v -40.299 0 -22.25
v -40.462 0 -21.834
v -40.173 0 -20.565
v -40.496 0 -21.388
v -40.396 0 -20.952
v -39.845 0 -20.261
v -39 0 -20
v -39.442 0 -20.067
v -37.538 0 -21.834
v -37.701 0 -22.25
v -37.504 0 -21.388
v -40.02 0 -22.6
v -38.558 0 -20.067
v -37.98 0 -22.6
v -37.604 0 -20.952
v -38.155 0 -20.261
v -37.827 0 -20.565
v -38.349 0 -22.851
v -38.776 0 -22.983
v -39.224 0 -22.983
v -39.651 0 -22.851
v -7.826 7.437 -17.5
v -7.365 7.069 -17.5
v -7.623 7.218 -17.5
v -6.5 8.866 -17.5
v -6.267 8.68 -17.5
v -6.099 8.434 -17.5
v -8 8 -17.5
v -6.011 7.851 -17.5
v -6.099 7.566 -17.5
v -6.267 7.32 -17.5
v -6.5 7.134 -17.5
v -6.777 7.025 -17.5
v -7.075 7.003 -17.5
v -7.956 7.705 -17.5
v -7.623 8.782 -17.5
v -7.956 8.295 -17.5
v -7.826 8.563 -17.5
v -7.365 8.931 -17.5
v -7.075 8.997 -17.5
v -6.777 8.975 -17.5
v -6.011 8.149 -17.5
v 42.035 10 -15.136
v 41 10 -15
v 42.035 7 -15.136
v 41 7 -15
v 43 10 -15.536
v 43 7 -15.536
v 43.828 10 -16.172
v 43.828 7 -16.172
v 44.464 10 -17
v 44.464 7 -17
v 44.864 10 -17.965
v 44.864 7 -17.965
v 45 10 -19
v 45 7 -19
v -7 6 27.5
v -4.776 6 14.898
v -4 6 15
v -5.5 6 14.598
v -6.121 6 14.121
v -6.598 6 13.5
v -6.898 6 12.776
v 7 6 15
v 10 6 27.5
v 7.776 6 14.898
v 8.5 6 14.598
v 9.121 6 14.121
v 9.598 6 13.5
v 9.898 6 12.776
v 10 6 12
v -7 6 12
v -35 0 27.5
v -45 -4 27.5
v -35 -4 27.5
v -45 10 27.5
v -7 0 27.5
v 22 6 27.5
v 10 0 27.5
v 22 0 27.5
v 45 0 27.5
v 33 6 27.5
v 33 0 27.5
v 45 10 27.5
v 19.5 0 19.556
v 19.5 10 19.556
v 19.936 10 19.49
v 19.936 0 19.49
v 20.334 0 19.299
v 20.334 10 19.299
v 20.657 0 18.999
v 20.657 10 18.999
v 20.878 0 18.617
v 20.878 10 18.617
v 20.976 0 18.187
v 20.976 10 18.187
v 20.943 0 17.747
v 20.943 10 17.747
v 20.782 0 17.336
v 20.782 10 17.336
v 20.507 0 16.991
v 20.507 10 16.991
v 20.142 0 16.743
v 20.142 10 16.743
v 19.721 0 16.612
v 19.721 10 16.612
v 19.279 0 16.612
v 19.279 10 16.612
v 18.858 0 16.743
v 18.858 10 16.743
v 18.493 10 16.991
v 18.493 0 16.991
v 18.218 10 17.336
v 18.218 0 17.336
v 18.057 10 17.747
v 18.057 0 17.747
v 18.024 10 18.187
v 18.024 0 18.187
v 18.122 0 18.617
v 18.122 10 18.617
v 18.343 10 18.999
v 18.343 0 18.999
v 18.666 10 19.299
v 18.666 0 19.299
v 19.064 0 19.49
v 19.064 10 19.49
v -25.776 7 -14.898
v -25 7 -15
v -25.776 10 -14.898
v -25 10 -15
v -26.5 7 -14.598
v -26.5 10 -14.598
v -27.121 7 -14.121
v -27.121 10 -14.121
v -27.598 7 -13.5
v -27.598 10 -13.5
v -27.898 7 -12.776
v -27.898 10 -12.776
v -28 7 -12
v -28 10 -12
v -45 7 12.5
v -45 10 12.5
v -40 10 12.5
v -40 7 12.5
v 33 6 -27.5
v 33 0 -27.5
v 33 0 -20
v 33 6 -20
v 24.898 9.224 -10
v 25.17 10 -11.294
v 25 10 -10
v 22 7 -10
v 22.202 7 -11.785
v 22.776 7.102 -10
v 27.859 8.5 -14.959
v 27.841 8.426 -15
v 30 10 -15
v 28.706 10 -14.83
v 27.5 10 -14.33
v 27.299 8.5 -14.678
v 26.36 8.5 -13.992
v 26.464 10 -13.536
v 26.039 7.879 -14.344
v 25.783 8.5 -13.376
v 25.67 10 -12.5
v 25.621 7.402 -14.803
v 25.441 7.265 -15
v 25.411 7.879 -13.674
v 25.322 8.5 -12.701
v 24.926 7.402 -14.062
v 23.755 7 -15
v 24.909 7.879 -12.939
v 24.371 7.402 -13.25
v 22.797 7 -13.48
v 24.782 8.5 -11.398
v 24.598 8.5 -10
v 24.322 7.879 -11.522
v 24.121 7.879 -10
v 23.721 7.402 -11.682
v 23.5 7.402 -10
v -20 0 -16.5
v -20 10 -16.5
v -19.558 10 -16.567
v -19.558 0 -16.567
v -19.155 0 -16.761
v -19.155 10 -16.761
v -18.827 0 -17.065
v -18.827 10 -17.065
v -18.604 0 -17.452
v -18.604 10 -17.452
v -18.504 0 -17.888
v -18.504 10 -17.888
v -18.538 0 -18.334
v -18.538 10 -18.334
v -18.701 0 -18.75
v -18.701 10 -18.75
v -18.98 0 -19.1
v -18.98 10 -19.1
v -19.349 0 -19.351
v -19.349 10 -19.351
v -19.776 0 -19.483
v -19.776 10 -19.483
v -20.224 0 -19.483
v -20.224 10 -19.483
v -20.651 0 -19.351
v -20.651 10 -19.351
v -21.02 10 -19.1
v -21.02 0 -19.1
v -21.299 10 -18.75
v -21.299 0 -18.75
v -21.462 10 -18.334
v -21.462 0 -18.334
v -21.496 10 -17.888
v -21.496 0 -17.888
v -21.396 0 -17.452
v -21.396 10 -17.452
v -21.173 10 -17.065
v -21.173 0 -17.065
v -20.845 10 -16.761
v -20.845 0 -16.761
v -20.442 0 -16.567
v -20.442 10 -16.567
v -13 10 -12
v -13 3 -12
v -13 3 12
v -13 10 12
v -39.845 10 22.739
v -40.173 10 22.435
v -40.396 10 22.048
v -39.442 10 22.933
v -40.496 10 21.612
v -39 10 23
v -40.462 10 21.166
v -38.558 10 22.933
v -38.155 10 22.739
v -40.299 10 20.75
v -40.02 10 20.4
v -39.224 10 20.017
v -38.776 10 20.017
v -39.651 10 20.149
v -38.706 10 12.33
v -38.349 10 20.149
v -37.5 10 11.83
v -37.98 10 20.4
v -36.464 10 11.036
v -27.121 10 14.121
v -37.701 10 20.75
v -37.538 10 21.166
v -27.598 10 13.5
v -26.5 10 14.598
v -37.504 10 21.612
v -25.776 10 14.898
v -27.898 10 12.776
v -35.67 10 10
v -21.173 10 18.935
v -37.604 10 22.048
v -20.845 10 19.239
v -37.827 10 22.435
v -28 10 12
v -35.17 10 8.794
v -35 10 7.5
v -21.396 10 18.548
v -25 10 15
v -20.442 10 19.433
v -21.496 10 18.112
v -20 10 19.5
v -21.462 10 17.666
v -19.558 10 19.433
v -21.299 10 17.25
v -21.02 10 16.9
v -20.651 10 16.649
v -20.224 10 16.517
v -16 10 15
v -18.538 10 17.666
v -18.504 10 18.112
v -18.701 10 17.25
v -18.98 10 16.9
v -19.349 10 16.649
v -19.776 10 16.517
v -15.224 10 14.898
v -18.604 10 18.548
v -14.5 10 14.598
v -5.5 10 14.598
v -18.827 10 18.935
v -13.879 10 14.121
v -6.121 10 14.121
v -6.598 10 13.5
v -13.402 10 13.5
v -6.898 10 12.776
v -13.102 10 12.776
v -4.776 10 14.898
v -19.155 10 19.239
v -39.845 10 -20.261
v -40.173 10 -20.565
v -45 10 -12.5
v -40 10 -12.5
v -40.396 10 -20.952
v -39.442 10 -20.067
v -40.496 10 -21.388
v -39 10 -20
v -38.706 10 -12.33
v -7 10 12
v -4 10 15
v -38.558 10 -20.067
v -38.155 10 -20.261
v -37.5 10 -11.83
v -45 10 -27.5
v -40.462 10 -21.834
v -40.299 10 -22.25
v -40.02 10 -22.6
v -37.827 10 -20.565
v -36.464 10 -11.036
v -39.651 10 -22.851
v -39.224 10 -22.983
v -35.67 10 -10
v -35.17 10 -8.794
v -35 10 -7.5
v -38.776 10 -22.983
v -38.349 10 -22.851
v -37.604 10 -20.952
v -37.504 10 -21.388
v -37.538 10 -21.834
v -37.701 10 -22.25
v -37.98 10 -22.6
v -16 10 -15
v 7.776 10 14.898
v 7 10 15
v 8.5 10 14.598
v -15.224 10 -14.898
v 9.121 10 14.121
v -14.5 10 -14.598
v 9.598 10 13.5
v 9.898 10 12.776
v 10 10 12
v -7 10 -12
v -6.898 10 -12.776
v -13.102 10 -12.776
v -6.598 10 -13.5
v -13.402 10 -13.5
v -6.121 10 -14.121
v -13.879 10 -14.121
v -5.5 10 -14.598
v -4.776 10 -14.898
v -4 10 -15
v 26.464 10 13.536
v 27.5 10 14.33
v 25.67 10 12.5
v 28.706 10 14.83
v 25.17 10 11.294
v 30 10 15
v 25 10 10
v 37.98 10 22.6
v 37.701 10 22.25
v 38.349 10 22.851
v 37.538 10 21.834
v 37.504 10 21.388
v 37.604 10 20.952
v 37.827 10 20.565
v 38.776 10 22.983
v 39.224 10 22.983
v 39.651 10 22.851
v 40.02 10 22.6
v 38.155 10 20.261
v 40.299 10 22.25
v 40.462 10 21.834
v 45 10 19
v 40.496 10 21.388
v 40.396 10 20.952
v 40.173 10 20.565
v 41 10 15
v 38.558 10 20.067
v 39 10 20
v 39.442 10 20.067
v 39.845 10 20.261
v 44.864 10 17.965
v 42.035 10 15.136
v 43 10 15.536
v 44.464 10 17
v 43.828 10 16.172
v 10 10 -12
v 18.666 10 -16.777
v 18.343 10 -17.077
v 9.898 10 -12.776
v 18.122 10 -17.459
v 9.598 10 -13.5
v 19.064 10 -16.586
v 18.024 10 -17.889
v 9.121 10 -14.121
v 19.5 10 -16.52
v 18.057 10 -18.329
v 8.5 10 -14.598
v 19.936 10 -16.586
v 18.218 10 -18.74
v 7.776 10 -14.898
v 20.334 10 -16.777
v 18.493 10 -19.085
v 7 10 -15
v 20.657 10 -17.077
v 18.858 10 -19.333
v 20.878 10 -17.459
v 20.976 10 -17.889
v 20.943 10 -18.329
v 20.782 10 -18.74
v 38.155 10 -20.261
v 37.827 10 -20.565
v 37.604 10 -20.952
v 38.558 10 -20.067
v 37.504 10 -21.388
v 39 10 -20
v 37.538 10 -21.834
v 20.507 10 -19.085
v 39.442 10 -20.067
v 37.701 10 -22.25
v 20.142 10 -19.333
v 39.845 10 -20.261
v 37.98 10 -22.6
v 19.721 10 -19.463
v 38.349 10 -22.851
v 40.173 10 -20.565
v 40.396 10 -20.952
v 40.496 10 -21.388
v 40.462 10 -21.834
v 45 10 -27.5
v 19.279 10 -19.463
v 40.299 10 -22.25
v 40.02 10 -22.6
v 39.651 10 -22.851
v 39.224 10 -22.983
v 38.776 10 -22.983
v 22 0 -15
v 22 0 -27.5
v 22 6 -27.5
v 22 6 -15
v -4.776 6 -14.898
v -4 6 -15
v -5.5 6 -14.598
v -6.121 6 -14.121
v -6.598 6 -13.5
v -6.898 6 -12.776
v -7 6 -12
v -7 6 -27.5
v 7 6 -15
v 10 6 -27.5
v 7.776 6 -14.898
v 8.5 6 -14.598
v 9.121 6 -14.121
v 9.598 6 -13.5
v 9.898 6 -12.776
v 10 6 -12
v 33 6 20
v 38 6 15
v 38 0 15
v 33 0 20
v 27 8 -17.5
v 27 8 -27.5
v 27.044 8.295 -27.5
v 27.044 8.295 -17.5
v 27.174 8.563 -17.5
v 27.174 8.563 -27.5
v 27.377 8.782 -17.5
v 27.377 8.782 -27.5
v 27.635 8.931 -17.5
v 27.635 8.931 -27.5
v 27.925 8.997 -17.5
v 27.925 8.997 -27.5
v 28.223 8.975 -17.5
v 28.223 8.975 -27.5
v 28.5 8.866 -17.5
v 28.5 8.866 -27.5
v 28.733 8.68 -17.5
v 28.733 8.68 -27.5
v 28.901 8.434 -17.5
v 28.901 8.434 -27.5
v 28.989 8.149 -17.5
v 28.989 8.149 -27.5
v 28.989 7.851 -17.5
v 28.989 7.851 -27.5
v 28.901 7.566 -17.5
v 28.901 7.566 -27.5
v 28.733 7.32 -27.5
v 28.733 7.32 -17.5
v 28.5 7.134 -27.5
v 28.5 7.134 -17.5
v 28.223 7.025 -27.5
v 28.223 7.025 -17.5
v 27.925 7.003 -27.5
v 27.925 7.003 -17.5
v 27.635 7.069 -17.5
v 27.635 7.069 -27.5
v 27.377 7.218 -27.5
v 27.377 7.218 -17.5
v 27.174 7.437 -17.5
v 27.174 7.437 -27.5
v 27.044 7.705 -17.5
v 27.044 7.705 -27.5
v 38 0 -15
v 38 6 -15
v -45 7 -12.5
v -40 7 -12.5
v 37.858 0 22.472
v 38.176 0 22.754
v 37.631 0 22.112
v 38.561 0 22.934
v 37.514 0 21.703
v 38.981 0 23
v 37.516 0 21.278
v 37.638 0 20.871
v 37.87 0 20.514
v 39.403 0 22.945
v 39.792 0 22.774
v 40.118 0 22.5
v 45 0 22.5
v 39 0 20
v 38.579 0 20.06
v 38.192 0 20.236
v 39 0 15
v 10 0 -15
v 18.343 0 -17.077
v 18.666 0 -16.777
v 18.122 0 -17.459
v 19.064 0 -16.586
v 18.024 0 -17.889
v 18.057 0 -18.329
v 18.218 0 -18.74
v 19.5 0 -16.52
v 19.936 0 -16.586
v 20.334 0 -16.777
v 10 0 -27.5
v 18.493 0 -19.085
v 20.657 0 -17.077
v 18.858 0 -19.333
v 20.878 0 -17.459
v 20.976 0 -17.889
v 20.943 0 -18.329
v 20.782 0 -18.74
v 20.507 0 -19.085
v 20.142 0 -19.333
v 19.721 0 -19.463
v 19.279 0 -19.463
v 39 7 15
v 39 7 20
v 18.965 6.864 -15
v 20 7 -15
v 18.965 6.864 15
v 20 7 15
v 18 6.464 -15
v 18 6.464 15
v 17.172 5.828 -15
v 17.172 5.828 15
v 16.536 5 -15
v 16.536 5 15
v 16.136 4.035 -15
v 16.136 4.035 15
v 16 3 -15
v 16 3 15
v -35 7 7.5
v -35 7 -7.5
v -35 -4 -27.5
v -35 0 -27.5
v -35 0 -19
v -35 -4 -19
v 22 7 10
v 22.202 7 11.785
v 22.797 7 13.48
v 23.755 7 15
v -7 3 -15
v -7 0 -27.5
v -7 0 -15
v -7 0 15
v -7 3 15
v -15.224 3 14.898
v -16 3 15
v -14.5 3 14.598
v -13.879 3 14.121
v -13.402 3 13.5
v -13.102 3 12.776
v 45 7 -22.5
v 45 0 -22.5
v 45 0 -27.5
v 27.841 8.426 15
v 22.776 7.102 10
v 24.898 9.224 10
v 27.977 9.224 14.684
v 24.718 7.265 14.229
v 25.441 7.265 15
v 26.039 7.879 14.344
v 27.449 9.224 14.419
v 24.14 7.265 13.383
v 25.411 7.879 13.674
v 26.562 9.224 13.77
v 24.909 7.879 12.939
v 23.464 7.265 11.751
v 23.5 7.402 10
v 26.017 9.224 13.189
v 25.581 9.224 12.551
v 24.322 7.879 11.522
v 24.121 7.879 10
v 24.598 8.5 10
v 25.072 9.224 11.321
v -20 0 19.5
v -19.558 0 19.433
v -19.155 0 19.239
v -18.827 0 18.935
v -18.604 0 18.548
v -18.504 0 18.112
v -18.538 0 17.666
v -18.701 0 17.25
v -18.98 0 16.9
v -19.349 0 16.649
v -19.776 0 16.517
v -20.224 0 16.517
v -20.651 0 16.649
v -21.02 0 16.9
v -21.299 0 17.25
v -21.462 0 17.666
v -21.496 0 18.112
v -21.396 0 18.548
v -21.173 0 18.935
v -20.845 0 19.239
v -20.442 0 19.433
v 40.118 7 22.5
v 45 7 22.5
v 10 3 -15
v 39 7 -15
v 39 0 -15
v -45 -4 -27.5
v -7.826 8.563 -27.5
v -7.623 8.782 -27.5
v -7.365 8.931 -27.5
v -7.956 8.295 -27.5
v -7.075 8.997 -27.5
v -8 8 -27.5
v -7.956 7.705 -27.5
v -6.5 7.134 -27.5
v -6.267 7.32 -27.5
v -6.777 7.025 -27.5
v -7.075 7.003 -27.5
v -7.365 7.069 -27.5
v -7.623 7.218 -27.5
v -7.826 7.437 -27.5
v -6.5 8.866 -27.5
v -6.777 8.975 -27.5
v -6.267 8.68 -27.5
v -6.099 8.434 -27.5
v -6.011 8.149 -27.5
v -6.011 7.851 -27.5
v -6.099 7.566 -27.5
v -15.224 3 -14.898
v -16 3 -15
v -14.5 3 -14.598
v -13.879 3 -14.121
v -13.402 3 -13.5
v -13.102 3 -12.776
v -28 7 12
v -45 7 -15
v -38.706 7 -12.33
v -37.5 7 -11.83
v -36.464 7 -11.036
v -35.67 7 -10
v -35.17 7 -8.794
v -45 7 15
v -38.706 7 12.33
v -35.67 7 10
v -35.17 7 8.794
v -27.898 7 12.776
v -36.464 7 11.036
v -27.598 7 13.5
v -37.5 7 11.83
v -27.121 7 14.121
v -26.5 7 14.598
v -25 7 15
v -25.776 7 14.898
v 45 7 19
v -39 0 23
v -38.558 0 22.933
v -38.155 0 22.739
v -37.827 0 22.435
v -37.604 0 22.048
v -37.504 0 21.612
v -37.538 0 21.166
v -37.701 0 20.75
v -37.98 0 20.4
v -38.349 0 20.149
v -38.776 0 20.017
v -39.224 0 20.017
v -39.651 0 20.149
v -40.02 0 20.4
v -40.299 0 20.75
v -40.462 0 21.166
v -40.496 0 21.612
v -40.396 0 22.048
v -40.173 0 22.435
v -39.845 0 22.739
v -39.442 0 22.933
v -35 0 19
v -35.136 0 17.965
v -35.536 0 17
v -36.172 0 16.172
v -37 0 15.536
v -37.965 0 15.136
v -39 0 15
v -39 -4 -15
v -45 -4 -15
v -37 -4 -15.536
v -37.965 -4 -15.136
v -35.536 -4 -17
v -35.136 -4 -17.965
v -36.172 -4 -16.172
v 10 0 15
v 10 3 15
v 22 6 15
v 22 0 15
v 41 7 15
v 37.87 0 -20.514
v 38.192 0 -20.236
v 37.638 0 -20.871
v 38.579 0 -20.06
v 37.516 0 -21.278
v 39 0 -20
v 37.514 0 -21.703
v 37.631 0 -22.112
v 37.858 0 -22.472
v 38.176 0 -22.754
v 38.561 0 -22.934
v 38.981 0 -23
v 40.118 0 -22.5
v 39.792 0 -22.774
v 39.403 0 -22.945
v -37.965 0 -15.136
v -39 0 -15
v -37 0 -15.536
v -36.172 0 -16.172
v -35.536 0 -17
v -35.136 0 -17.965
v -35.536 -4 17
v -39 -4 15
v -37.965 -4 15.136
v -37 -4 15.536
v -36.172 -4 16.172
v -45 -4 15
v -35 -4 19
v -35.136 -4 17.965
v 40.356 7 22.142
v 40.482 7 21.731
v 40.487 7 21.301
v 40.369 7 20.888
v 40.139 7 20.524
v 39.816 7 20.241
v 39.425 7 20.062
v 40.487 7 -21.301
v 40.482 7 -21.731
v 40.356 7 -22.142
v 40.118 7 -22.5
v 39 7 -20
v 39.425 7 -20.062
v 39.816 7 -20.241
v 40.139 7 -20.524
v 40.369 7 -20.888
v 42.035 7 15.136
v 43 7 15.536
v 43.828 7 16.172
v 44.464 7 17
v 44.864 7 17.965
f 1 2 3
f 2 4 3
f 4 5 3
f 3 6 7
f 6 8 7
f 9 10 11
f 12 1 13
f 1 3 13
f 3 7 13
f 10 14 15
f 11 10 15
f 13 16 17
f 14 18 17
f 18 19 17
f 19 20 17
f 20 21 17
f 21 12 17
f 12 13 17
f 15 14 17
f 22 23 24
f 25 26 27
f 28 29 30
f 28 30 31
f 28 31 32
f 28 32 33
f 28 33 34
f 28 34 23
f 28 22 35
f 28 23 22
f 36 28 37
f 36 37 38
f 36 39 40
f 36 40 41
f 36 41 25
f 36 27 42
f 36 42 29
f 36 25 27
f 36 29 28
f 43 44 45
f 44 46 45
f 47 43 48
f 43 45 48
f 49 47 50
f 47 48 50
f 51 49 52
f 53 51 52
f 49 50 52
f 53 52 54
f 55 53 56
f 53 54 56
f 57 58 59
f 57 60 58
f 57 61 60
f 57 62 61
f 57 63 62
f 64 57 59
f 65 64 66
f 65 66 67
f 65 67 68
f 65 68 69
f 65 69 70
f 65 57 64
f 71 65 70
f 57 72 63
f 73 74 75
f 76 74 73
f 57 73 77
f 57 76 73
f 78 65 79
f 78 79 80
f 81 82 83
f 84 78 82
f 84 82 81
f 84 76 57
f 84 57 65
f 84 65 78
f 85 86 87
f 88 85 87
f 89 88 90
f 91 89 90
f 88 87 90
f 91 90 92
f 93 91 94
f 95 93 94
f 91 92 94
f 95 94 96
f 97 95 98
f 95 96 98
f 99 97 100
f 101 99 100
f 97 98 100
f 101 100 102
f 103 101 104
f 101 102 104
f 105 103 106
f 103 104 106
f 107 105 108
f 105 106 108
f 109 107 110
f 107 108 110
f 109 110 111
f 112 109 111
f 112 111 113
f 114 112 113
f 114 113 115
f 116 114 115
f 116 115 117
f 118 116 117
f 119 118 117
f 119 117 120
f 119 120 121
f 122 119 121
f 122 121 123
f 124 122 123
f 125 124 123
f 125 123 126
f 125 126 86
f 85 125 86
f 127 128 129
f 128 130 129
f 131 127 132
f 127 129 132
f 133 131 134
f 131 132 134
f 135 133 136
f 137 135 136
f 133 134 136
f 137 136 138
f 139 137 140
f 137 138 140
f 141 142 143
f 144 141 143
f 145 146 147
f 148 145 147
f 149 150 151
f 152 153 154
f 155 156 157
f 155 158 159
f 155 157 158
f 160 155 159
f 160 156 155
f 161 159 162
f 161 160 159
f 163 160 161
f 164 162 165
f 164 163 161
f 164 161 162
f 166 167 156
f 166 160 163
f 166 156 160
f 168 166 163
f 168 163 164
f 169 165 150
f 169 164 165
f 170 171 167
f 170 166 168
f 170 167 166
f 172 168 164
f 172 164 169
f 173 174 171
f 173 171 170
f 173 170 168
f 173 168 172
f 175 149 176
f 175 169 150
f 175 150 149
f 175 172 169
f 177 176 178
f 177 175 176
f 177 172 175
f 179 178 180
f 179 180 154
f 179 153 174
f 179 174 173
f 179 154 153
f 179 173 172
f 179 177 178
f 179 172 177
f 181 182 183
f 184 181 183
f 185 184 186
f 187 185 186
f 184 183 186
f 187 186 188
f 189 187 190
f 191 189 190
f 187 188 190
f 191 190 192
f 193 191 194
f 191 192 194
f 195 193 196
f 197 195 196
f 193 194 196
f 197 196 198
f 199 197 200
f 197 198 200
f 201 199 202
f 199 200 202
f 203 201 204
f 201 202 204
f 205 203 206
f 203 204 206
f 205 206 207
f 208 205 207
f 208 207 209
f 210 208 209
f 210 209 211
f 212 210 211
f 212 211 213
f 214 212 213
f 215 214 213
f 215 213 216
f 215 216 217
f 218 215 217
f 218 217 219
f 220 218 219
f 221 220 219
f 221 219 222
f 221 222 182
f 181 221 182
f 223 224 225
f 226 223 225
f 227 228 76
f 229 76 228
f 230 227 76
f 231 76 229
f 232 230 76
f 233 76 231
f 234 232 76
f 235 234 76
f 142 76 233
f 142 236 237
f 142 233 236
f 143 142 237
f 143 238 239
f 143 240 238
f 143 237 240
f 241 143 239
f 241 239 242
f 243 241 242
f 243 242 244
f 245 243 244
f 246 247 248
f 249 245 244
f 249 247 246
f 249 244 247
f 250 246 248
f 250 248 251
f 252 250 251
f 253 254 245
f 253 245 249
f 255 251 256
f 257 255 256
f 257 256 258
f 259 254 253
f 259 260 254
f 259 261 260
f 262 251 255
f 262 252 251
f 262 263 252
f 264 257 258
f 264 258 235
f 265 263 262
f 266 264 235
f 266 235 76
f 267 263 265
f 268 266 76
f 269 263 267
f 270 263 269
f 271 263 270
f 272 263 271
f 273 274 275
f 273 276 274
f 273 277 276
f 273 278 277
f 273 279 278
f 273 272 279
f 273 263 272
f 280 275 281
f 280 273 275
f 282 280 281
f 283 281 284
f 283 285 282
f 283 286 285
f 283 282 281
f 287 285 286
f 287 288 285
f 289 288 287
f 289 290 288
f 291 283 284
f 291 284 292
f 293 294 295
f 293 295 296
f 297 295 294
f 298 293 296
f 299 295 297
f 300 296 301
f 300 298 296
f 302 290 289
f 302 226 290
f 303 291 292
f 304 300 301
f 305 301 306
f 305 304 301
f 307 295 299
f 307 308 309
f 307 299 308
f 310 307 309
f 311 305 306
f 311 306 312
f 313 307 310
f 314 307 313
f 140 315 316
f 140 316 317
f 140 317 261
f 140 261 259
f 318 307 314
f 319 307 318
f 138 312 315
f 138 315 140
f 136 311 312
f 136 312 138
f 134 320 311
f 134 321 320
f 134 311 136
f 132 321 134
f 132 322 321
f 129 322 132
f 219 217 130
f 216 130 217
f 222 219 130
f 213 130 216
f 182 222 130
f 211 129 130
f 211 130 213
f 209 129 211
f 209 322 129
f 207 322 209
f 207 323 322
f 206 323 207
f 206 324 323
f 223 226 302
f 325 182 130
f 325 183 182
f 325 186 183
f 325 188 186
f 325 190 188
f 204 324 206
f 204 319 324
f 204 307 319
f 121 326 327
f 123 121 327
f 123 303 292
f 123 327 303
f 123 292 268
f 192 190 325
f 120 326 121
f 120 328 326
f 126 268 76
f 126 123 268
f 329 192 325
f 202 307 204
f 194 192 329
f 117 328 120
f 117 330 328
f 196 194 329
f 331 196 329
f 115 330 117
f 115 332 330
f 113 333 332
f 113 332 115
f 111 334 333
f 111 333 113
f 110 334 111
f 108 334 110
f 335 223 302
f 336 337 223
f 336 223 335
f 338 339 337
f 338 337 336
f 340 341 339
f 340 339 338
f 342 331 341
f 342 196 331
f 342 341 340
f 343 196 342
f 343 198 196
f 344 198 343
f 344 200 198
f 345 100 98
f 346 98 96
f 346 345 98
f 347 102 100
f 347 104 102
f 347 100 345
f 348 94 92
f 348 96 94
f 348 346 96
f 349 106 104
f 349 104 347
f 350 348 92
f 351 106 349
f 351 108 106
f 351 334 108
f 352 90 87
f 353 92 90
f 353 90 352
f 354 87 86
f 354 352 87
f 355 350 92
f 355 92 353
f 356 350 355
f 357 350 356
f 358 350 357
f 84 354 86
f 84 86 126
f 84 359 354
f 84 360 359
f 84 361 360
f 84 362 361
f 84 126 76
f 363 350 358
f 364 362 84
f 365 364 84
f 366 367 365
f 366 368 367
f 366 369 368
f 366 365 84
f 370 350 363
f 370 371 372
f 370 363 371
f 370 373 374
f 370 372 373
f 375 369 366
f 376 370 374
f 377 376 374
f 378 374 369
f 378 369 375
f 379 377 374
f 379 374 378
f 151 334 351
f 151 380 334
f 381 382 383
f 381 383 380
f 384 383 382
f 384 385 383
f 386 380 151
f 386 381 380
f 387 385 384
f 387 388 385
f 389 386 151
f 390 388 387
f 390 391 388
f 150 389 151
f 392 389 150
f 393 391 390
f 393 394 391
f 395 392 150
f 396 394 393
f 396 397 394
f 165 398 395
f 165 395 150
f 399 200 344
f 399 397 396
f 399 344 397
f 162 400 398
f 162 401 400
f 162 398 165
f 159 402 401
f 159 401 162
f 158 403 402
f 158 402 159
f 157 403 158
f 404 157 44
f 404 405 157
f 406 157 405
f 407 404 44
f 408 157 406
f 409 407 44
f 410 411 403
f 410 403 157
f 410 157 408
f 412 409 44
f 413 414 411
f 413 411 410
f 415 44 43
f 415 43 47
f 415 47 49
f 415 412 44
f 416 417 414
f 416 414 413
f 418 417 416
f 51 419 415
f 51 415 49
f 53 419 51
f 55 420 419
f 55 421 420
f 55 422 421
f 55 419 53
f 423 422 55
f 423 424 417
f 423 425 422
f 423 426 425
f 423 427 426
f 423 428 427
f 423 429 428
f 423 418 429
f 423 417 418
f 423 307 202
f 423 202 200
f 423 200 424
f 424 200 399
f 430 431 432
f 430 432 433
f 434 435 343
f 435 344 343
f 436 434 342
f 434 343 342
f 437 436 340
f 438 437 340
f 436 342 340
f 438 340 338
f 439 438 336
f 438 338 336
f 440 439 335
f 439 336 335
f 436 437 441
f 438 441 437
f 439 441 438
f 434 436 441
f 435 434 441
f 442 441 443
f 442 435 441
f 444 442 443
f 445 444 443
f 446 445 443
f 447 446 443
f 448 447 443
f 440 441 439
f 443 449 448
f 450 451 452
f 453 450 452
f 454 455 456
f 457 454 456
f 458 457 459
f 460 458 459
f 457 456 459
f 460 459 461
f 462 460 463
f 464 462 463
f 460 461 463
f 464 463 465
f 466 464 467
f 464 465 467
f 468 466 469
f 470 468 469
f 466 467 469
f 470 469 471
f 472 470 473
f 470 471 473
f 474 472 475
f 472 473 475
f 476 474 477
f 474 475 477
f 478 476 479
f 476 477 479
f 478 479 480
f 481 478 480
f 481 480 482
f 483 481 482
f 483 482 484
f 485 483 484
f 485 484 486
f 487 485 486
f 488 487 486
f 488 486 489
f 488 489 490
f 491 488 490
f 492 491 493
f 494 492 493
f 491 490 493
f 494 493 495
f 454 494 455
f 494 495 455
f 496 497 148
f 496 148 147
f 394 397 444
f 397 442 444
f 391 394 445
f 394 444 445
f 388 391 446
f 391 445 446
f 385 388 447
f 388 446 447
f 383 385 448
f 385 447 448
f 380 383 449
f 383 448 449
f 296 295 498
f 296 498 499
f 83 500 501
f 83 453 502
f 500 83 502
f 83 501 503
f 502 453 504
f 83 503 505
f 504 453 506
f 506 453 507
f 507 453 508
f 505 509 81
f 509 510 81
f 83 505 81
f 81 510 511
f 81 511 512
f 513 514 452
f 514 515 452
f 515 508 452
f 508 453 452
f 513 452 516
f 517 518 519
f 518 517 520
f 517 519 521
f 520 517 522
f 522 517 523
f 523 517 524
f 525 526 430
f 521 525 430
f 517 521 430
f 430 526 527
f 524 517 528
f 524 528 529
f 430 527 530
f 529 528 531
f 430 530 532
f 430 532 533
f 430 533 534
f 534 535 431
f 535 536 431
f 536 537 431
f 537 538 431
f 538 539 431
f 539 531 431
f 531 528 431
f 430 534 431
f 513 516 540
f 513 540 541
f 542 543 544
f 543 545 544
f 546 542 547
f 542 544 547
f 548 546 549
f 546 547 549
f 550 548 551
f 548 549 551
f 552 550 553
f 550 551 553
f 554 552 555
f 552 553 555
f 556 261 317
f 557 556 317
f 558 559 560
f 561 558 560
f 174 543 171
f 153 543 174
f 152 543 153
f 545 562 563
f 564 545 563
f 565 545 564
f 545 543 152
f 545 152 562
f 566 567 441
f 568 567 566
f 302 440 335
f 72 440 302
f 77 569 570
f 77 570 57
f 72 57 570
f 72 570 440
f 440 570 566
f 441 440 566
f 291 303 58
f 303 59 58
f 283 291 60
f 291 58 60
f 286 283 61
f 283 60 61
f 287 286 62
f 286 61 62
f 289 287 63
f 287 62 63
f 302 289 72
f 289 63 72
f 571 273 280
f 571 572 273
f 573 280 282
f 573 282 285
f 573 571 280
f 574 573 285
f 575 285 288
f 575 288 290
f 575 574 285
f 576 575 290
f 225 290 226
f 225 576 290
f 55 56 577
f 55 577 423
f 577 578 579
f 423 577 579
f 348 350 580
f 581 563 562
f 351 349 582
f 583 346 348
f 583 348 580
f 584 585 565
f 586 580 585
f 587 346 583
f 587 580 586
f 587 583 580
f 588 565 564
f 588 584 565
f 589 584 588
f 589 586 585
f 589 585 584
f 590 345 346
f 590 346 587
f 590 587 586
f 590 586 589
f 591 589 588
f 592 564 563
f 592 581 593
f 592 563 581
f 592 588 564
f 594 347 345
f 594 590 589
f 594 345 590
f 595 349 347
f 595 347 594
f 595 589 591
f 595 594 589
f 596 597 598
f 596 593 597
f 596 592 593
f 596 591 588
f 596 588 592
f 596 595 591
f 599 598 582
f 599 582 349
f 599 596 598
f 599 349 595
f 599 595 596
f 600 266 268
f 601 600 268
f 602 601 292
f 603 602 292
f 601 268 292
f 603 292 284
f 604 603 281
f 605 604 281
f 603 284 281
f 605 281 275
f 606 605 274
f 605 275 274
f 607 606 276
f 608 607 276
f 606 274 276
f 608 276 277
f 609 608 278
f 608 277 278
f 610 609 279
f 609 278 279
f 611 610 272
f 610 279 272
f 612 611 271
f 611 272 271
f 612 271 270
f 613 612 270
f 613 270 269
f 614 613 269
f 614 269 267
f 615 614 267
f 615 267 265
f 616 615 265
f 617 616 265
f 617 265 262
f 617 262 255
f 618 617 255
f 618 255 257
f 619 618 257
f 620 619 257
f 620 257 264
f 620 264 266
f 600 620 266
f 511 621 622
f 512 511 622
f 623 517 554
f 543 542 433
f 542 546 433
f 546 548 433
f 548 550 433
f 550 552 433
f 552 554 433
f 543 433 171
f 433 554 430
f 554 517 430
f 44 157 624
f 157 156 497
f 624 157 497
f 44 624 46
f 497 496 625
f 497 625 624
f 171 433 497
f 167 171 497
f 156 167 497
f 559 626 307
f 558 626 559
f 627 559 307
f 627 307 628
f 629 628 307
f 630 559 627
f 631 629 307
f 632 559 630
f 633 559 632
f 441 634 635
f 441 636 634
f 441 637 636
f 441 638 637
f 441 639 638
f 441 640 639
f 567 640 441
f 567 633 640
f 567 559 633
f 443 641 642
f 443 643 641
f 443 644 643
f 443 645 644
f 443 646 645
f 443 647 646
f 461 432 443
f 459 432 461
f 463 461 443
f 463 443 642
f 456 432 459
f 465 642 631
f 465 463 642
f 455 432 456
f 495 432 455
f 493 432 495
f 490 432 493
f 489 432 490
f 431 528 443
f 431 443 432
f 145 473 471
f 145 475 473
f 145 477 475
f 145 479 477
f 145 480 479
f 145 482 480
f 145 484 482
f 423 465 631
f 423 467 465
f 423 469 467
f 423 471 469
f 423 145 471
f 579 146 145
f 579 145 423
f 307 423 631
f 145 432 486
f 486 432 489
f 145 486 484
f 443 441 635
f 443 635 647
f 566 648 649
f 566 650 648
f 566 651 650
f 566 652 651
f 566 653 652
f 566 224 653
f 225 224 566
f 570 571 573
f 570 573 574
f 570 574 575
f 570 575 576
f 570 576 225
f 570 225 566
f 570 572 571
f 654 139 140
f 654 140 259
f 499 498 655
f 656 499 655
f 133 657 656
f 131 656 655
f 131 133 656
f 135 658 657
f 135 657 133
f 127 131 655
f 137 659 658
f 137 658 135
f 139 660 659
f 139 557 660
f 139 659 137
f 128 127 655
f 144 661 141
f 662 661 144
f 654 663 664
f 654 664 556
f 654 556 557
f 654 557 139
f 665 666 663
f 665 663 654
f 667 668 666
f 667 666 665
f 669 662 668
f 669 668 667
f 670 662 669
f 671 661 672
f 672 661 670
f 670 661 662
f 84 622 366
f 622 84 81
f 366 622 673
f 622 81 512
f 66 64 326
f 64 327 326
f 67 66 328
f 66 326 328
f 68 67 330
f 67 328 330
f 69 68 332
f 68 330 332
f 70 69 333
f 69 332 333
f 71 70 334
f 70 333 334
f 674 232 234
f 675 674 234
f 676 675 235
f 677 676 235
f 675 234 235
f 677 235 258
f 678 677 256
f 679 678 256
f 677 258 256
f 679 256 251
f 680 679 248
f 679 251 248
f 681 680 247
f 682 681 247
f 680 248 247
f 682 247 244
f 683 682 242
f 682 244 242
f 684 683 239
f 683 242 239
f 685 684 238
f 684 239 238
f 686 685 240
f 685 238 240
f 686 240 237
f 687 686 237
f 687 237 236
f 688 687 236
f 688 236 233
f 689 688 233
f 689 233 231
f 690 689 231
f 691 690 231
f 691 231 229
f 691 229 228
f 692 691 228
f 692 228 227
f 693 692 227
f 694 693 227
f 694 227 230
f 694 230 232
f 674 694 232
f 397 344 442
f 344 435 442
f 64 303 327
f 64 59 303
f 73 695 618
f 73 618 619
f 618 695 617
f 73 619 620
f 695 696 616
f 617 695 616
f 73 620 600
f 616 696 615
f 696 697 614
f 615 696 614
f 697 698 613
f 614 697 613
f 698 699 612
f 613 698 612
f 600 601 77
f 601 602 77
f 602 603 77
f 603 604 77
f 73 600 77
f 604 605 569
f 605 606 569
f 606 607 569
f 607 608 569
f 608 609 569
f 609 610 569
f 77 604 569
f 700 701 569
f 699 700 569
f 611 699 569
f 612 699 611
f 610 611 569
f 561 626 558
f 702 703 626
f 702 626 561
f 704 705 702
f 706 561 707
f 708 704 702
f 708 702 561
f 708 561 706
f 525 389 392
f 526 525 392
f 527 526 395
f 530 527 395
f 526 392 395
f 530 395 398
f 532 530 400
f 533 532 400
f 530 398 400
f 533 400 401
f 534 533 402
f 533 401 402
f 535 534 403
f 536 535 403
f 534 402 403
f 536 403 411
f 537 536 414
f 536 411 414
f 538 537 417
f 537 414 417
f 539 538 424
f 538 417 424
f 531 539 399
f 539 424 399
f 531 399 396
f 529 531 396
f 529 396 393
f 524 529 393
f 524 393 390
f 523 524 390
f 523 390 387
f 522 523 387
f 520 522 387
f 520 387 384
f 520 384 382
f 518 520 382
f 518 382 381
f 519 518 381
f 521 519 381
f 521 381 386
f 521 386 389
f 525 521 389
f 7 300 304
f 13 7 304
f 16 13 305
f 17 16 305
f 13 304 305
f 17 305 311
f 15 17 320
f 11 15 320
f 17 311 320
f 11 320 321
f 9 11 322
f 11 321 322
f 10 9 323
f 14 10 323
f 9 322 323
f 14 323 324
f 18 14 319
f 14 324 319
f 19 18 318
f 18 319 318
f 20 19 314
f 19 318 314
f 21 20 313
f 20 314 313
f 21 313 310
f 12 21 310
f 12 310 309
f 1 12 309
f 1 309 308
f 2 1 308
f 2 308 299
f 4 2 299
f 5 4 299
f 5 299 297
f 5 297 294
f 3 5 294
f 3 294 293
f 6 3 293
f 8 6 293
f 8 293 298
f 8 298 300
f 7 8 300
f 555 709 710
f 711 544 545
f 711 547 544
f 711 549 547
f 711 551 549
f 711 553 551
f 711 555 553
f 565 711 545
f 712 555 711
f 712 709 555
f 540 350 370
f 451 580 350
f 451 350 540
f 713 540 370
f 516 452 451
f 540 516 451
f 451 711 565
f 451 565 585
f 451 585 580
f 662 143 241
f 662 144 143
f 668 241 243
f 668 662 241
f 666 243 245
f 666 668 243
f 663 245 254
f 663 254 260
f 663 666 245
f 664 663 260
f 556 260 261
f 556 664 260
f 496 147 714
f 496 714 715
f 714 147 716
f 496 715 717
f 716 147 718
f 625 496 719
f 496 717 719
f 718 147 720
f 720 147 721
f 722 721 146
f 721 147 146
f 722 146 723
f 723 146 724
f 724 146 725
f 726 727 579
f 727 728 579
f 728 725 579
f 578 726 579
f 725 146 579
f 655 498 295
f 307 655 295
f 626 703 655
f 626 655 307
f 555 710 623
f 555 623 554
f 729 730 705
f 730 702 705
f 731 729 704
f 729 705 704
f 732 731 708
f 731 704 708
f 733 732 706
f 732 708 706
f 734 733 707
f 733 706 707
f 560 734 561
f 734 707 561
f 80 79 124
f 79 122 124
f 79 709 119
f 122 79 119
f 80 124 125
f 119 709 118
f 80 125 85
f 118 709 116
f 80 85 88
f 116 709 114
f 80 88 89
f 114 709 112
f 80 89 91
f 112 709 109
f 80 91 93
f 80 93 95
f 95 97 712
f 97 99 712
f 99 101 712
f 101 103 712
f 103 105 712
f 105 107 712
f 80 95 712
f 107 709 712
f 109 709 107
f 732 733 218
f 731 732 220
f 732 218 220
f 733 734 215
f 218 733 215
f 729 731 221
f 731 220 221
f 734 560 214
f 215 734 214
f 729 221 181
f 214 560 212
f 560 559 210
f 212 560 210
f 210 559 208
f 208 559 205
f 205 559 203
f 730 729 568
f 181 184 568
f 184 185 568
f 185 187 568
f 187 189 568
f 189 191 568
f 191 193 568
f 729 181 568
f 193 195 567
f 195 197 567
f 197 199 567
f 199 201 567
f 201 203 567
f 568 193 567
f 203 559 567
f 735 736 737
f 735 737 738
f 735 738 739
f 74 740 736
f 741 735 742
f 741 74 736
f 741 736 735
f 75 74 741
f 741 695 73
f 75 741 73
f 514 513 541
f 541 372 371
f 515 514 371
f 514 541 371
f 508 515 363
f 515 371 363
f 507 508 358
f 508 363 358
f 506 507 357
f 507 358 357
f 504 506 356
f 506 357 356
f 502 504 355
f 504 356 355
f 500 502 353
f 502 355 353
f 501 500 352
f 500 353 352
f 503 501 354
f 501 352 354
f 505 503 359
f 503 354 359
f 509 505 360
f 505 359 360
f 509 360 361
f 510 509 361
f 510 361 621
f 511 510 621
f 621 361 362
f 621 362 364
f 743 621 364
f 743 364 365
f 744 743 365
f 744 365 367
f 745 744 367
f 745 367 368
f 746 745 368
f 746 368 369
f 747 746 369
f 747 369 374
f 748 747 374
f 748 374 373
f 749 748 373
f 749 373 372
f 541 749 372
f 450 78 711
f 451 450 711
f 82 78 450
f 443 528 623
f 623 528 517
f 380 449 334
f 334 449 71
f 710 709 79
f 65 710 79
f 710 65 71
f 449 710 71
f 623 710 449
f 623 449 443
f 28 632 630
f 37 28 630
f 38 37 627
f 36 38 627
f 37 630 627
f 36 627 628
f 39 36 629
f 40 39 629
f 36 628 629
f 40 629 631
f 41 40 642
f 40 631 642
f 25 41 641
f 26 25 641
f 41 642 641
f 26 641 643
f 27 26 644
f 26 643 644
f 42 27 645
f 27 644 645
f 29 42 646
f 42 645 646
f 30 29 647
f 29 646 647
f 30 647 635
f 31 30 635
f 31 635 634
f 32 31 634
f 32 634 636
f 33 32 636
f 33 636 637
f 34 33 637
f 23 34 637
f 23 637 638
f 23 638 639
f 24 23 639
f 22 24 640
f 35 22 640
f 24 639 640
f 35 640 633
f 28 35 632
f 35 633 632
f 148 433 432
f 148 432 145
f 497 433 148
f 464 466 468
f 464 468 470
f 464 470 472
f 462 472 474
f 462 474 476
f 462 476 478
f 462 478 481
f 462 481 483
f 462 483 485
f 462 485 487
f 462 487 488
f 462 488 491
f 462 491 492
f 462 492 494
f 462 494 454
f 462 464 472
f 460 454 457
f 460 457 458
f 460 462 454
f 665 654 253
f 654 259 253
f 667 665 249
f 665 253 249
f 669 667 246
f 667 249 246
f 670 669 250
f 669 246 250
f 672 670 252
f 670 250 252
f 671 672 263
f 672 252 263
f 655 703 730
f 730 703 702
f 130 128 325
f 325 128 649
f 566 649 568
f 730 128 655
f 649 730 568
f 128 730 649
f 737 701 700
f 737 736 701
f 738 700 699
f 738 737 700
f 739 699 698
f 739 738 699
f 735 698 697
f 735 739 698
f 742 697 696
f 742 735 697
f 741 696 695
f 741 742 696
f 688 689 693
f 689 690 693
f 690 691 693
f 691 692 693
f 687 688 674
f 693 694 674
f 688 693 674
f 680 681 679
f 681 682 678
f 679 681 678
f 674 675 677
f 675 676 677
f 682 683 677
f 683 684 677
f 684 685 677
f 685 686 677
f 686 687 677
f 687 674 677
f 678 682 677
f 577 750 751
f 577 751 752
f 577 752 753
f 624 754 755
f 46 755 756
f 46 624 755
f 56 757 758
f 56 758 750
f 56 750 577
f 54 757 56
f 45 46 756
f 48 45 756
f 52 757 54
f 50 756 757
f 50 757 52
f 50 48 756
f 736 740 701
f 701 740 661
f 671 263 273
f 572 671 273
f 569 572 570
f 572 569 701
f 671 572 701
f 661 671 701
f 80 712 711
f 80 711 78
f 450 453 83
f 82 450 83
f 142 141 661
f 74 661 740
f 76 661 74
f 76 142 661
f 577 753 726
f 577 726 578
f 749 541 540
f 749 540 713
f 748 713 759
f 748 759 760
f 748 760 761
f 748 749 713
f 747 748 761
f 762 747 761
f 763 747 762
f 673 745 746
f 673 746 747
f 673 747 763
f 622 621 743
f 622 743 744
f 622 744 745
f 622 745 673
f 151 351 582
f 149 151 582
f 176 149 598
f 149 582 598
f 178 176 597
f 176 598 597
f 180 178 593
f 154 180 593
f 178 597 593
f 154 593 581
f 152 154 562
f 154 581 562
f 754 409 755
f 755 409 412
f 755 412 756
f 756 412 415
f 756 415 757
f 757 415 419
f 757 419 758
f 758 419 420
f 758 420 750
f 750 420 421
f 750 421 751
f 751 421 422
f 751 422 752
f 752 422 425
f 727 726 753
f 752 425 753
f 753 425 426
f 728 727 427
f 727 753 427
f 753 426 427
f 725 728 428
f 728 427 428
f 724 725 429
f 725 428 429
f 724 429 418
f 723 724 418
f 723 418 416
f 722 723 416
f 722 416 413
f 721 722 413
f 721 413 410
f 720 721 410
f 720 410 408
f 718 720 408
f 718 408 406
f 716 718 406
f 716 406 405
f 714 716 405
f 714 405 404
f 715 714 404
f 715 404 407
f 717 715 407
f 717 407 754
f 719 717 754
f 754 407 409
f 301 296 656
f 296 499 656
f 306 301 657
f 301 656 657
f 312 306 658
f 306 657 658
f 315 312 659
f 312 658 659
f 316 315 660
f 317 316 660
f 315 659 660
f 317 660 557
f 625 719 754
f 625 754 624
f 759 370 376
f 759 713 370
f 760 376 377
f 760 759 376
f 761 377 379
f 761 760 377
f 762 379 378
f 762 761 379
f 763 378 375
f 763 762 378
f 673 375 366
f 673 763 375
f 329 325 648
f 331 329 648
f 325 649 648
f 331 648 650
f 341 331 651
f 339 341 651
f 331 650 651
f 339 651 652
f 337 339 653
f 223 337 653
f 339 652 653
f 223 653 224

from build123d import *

# Parameters (mm, degrees)
SKETCH_1_W           = 90
SKETCH_1_H           = 55
EXTRUDE_1_DEPTH      = 10
SKETCH_2_R           = 1.5
SKETCH_2_R_2         = 1.48
CUT_EXTRUDE_1_DEPTH  = 30
SKETCH_3_W           = 80
SKETCH_3_H           = 30
SKETCH_3_W_2         = 6
SKETCH_3_H_2         = 45
CUT_EXTRUDE_2_DEPTH  = 7
SKETCH_4_R           = 1.5
CUT_EXTRUDE_3_DEPTH  = 20
SKETCH_8_W           = 10
SKETCH_8_H           = 25
SKETCH_8_W_2         = 20
SKETCH_8_H_2         = 30
CUT_EXTRUDE_6_DEPTH  = 20
SKETCH_10_W          = 11
SKETCH_10_H          = 55
SKETCH_10_W_2        = 17
CUT_EXTRUDE_8_DEPTH  = 6
FILLET_3_R           = 5
SKETCH_11_W          = 6
SKETCH_11_H          = 30
EXTRUDE_3_DEPTH      = 4
CHAMFER_3_SIZE       = 5
FILLET_7_R           = 3
SKETCH_12_W          = 15
SKETCH_12_H          = 30
SKETCH_12_W_2        = 17
CUT_EXTRUDE_9_DEPTH  = 6
FILLET_8_R           = 3
FILLET_9_R           = 4
SKETCH_13_W          = 10
SKETCH_13_H          = 12.5
EXTRUDE_4_DEPTH      = 4
FILLET_10_R          = 4
FILLET_11_R          = 4
SKETCH_14_R          = 1
CUT_EXTRUDE_10_DEPTH = 10


# Some blends are built 0.0001 mm under size
with BuildPart() as part:
    # 草图1 → 凸台-拉伸1 (new body)
    with BuildSketch(Plane(origin=(0, 0, 0), x_dir=(1, 0, 0), z_dir=(0, 1, 0))):
        Rectangle(SKETCH_1_W, SKETCH_1_H)
    extrude(amount=EXTRUDE_1_DEPTH)

    # 草图2 → 切除-拉伸1 (cut)
    with BuildSketch(Plane(origin=(0, 10, 0), x_dir=(1, 0, 0), z_dir=(0, 1, 0))):
        with Locations(Location((-20, 18, 0), (0, 0, 270))):
            Circle(SKETCH_2_R)
        with Locations(Location((-20, -18, 0), (0, 0, 270))):
            Circle(SKETCH_2_R)
        with Locations(Location((19.5, -18.075939793, 0), (0, 0, 270))):
            Circle(SKETCH_2_R_2)
        with Locations(Location((19.5, 18, 0), (0, 0, 270))):
            Circle(SKETCH_2_R_2)
    extrude(amount=-CUT_EXTRUDE_1_DEPTH, mode=Mode.SUBTRACT)

    # 草图3 → 切除-拉伸2 (cut)
    with BuildSketch(Plane.XZ):
        with Locations((-5, 0)):
            Rectangle(SKETCH_3_W, SKETCH_3_H)
        with Locations((42, 0)):
            Rectangle(SKETCH_3_W_2, SKETCH_3_H_2)
    extrude(amount=-CUT_EXTRUDE_2_DEPTH, mode=Mode.SUBTRACT)

    # 草图4 → 切除-拉伸3 (cut)
    with BuildSketch(Plane(origin=(0, 10, 0), x_dir=(1, 0, 0), z_dir=(0, 1, 0))):
        with Locations(Location((39, 21.5, 0), (0, 0, 270))):
            Circle(SKETCH_4_R)
        with Locations(Location((-39, 21.5, 0), (0, 0, 270))):
            Circle(SKETCH_4_R)
        with Locations(Location((-39, -21.5, 0), (0, 0, 270))):
            Circle(SKETCH_4_R)
        with Locations(Location((39, -21.5, 0), (0, 0, 90))):
            Circle(SKETCH_4_R)
    extrude(amount=-CUT_EXTRUDE_3_DEPTH, mode=Mode.SUBTRACT)

    # 草图8 → 切除-拉伸6 (cut)
    with BuildSketch(Plane(origin=(0, 10, 0), x_dir=(1, 0, 0), z_dir=(0, 1, 0))):
        with Locations((-40, 0)):
            Rectangle(SKETCH_8_W, SKETCH_8_H)
        with Locations((35, 0)):
            Rectangle(SKETCH_8_W_2, SKETCH_8_H_2)
    extrude(amount=-CUT_EXTRUDE_6_DEPTH, mode=Mode.SUBTRACT)

    # 草图10 → 切除-拉伸8 (cut)
    with BuildSketch(Plane.XZ):
        with Locations((27.5, 0)):
            Rectangle(SKETCH_10_W, SKETCH_10_H)
        with Locations((1.5, 0)):
            Rectangle(SKETCH_10_W_2, SKETCH_10_H)
    extrude(amount=-CUT_EXTRUDE_8_DEPTH, mode=Mode.SUBTRACT)

    # 圆角3
    fillet_3_edges = [part.edges().sort_by_distance(p)[0] for p in [
        (-35, 8.5, -12.5),
        (-35, 8.5, 12.5),
        (25, 8.5, 15),
        (25, 8.5, -15),
    ]]
    fillet(fillet_3_edges, radius=FILLET_3_R)

    # 草图11 → 凸台-拉伸3 (add)
    with BuildSketch(Plane.XZ.offset(-7)):
        with Locations((-10, 0)):
            Rectangle(SKETCH_11_W, SKETCH_11_H)
        with Locations((13, 0)):
            Rectangle(SKETCH_11_W, SKETCH_11_H)
    extrude(amount=EXTRUDE_3_DEPTH)

    # 倒角3
    chamfer_3_edges = [part.edges().sort_by_distance(p)[0] for p in [
        (33, 3, 15),
        (33, 3, -15),
    ]]
    chamfer(chamfer_3_edges, length=CHAMFER_3_SIZE)

    # 圆角7
    # the kernel refuses this fillet: 3 mm, written as the material it takes off along each edge
    with BuildSketch(Plane(origin=(25, 7, 10), x_dir=(0, 1, 0), z_dir=(0, 0, -1))) as fillet_7_piece_1:
        with BuildLine():
            CenterArc((FILLET_7_R, -FILLET_7_R), FILLET_7_R, 90, 90)
            Line((0, -FILLET_7_R), (0, 0))
            Line((0, 0), (FILLET_7_R, 0))
        make_face()
    extrude(amount=20, mode=Mode.SUBTRACT)
    with BuildSketch(Plane(origin=(30, 7, 10), x_dir=(0.9975374290817743, 0, 0.0701361360564157), z_dir=(0.0701361360564157, 0, -0.9975374290817743))) as fillet_7_piece_2_section:
        with BuildLine():
            CenterArc((5 + FILLET_7_R, -FILLET_7_R), FILLET_7_R, 90, 90)
            Line((5 + FILLET_7_R, 0), (5, 0))
            Line((5, 0), (5, -FILLET_7_R))
        make_face()
    fillet_7_piece_2 = revolve(axis=Axis((30, 7, 10), (0, -1, 0)), revolution_arc=175.978193542, mode=Mode.PRIVATE)
    fillet_7_piece_2 = split(fillet_7_piece_2, bisect_by=Plane(origin=(26.314129742, 7.843114036, 15), z_dir=(0, 0, -1)), keep=Keep.TOP, mode=Mode.PRIVATE)
    add(fillet_7_piece_2, mode=Mode.SUBTRACT)
    with BuildSketch(Plane(origin=(30, 7, -10), x_dir=(0.9975374290817743, 0, -0.0701361360564157), z_dir=(0.0701361360564157, 0, 0.9975374290817743))) as fillet_7_piece_3_section:
        with BuildLine():
            CenterArc((5 + FILLET_7_R, FILLET_7_R), FILLET_7_R, 180, 90)
            Line((5 + FILLET_7_R, 0), (5, 0))
            Line((5, 0), (5, FILLET_7_R))
        make_face()
    fillet_7_piece_3 = revolve(axis=Axis((30, 7, -10), (0, 1, 0)), revolution_arc=175.978193542, mode=Mode.PRIVATE)
    fillet_7_piece_3 = split(fillet_7_piece_3, bisect_by=Plane(origin=(26.31413004, 7.843114018, -15), z_dir=(0, 0, 1)), keep=Keep.TOP, mode=Mode.PRIVATE)
    add(fillet_7_piece_3, mode=Mode.SUBTRACT)

    # 草图12 → 切除-拉伸9 (cut)
    with BuildSketch(Plane.XZ.offset(-7)):
        with Locations((-20.5, 0)):
            Rectangle(SKETCH_12_W, SKETCH_12_H)
        with Locations((1.5, 0)):
            Rectangle(SKETCH_12_W_2, SKETCH_12_H)
    extrude(amount=-CUT_EXTRUDE_9_DEPTH, mode=Mode.SUBTRACT)

    # 圆角8
    fillet_8_edges = [part.edges().sort_by_distance(p)[0] for p in [
        (-7, 8, -15),
        (-7, 8, 15),
        (-13, 6.5, 15),
        (-13, 6.5, -15),
        (10, 8, 15),
        (10, 8, -15),
        (-28, 8.5, -15),
        (-28, 8.5, 15),
    ]]
    fillet(fillet_8_edges, radius=FILLET_8_R)

    # 圆角9
    fillet_9_edges = [part.edges().sort_by_distance(p)[0] for p in [
        (16, 7, 0),
    ]]
    fillet(fillet_9_edges, radius=FILLET_9_R - 0.0001)  # a hair under: the kernel refuses the full size

    # 草图13 → 凸台-拉伸4 (add)
    with BuildSketch(Plane.XZ):
        with Locations((-40, 21.25)):
            Rectangle(SKETCH_13_W, SKETCH_13_H)
        with Locations((-40, -21.25)):
            Rectangle(SKETCH_13_W, SKETCH_13_H)
    extrude(amount=EXTRUDE_4_DEPTH)

    # 圆角10
    fillet_10_edges = [part.edges().sort_by_distance(p)[0] for p in [
        (-35, -2, 15),
        (-35, -2, -15),
    ]]
    fillet(fillet_10_edges, radius=FILLET_10_R)

    # 圆角11
    fillet_11_edges = [part.edges().sort_by_distance(p)[0] for p in [
        (45, 8.5, 15),
        (45, 8.5, -15),
    ]]
    fillet(fillet_11_edges, radius=FILLET_11_R)

    # 草图14 → 切除-拉伸10 (cut)
    with BuildSketch(Plane(origin=(0, 0, -27.5), x_dir=(-1, 0, 0), z_dir=(0, 0, -1))):
        with Locations((-28, 8)):
            Circle(SKETCH_14_R)
        with Locations((7, 8)):
            Circle(SKETCH_14_R)
    extrude(amount=-CUT_EXTRUDE_10_DEPTH, mode=Mode.SUBTRACT)


solid = part.part
